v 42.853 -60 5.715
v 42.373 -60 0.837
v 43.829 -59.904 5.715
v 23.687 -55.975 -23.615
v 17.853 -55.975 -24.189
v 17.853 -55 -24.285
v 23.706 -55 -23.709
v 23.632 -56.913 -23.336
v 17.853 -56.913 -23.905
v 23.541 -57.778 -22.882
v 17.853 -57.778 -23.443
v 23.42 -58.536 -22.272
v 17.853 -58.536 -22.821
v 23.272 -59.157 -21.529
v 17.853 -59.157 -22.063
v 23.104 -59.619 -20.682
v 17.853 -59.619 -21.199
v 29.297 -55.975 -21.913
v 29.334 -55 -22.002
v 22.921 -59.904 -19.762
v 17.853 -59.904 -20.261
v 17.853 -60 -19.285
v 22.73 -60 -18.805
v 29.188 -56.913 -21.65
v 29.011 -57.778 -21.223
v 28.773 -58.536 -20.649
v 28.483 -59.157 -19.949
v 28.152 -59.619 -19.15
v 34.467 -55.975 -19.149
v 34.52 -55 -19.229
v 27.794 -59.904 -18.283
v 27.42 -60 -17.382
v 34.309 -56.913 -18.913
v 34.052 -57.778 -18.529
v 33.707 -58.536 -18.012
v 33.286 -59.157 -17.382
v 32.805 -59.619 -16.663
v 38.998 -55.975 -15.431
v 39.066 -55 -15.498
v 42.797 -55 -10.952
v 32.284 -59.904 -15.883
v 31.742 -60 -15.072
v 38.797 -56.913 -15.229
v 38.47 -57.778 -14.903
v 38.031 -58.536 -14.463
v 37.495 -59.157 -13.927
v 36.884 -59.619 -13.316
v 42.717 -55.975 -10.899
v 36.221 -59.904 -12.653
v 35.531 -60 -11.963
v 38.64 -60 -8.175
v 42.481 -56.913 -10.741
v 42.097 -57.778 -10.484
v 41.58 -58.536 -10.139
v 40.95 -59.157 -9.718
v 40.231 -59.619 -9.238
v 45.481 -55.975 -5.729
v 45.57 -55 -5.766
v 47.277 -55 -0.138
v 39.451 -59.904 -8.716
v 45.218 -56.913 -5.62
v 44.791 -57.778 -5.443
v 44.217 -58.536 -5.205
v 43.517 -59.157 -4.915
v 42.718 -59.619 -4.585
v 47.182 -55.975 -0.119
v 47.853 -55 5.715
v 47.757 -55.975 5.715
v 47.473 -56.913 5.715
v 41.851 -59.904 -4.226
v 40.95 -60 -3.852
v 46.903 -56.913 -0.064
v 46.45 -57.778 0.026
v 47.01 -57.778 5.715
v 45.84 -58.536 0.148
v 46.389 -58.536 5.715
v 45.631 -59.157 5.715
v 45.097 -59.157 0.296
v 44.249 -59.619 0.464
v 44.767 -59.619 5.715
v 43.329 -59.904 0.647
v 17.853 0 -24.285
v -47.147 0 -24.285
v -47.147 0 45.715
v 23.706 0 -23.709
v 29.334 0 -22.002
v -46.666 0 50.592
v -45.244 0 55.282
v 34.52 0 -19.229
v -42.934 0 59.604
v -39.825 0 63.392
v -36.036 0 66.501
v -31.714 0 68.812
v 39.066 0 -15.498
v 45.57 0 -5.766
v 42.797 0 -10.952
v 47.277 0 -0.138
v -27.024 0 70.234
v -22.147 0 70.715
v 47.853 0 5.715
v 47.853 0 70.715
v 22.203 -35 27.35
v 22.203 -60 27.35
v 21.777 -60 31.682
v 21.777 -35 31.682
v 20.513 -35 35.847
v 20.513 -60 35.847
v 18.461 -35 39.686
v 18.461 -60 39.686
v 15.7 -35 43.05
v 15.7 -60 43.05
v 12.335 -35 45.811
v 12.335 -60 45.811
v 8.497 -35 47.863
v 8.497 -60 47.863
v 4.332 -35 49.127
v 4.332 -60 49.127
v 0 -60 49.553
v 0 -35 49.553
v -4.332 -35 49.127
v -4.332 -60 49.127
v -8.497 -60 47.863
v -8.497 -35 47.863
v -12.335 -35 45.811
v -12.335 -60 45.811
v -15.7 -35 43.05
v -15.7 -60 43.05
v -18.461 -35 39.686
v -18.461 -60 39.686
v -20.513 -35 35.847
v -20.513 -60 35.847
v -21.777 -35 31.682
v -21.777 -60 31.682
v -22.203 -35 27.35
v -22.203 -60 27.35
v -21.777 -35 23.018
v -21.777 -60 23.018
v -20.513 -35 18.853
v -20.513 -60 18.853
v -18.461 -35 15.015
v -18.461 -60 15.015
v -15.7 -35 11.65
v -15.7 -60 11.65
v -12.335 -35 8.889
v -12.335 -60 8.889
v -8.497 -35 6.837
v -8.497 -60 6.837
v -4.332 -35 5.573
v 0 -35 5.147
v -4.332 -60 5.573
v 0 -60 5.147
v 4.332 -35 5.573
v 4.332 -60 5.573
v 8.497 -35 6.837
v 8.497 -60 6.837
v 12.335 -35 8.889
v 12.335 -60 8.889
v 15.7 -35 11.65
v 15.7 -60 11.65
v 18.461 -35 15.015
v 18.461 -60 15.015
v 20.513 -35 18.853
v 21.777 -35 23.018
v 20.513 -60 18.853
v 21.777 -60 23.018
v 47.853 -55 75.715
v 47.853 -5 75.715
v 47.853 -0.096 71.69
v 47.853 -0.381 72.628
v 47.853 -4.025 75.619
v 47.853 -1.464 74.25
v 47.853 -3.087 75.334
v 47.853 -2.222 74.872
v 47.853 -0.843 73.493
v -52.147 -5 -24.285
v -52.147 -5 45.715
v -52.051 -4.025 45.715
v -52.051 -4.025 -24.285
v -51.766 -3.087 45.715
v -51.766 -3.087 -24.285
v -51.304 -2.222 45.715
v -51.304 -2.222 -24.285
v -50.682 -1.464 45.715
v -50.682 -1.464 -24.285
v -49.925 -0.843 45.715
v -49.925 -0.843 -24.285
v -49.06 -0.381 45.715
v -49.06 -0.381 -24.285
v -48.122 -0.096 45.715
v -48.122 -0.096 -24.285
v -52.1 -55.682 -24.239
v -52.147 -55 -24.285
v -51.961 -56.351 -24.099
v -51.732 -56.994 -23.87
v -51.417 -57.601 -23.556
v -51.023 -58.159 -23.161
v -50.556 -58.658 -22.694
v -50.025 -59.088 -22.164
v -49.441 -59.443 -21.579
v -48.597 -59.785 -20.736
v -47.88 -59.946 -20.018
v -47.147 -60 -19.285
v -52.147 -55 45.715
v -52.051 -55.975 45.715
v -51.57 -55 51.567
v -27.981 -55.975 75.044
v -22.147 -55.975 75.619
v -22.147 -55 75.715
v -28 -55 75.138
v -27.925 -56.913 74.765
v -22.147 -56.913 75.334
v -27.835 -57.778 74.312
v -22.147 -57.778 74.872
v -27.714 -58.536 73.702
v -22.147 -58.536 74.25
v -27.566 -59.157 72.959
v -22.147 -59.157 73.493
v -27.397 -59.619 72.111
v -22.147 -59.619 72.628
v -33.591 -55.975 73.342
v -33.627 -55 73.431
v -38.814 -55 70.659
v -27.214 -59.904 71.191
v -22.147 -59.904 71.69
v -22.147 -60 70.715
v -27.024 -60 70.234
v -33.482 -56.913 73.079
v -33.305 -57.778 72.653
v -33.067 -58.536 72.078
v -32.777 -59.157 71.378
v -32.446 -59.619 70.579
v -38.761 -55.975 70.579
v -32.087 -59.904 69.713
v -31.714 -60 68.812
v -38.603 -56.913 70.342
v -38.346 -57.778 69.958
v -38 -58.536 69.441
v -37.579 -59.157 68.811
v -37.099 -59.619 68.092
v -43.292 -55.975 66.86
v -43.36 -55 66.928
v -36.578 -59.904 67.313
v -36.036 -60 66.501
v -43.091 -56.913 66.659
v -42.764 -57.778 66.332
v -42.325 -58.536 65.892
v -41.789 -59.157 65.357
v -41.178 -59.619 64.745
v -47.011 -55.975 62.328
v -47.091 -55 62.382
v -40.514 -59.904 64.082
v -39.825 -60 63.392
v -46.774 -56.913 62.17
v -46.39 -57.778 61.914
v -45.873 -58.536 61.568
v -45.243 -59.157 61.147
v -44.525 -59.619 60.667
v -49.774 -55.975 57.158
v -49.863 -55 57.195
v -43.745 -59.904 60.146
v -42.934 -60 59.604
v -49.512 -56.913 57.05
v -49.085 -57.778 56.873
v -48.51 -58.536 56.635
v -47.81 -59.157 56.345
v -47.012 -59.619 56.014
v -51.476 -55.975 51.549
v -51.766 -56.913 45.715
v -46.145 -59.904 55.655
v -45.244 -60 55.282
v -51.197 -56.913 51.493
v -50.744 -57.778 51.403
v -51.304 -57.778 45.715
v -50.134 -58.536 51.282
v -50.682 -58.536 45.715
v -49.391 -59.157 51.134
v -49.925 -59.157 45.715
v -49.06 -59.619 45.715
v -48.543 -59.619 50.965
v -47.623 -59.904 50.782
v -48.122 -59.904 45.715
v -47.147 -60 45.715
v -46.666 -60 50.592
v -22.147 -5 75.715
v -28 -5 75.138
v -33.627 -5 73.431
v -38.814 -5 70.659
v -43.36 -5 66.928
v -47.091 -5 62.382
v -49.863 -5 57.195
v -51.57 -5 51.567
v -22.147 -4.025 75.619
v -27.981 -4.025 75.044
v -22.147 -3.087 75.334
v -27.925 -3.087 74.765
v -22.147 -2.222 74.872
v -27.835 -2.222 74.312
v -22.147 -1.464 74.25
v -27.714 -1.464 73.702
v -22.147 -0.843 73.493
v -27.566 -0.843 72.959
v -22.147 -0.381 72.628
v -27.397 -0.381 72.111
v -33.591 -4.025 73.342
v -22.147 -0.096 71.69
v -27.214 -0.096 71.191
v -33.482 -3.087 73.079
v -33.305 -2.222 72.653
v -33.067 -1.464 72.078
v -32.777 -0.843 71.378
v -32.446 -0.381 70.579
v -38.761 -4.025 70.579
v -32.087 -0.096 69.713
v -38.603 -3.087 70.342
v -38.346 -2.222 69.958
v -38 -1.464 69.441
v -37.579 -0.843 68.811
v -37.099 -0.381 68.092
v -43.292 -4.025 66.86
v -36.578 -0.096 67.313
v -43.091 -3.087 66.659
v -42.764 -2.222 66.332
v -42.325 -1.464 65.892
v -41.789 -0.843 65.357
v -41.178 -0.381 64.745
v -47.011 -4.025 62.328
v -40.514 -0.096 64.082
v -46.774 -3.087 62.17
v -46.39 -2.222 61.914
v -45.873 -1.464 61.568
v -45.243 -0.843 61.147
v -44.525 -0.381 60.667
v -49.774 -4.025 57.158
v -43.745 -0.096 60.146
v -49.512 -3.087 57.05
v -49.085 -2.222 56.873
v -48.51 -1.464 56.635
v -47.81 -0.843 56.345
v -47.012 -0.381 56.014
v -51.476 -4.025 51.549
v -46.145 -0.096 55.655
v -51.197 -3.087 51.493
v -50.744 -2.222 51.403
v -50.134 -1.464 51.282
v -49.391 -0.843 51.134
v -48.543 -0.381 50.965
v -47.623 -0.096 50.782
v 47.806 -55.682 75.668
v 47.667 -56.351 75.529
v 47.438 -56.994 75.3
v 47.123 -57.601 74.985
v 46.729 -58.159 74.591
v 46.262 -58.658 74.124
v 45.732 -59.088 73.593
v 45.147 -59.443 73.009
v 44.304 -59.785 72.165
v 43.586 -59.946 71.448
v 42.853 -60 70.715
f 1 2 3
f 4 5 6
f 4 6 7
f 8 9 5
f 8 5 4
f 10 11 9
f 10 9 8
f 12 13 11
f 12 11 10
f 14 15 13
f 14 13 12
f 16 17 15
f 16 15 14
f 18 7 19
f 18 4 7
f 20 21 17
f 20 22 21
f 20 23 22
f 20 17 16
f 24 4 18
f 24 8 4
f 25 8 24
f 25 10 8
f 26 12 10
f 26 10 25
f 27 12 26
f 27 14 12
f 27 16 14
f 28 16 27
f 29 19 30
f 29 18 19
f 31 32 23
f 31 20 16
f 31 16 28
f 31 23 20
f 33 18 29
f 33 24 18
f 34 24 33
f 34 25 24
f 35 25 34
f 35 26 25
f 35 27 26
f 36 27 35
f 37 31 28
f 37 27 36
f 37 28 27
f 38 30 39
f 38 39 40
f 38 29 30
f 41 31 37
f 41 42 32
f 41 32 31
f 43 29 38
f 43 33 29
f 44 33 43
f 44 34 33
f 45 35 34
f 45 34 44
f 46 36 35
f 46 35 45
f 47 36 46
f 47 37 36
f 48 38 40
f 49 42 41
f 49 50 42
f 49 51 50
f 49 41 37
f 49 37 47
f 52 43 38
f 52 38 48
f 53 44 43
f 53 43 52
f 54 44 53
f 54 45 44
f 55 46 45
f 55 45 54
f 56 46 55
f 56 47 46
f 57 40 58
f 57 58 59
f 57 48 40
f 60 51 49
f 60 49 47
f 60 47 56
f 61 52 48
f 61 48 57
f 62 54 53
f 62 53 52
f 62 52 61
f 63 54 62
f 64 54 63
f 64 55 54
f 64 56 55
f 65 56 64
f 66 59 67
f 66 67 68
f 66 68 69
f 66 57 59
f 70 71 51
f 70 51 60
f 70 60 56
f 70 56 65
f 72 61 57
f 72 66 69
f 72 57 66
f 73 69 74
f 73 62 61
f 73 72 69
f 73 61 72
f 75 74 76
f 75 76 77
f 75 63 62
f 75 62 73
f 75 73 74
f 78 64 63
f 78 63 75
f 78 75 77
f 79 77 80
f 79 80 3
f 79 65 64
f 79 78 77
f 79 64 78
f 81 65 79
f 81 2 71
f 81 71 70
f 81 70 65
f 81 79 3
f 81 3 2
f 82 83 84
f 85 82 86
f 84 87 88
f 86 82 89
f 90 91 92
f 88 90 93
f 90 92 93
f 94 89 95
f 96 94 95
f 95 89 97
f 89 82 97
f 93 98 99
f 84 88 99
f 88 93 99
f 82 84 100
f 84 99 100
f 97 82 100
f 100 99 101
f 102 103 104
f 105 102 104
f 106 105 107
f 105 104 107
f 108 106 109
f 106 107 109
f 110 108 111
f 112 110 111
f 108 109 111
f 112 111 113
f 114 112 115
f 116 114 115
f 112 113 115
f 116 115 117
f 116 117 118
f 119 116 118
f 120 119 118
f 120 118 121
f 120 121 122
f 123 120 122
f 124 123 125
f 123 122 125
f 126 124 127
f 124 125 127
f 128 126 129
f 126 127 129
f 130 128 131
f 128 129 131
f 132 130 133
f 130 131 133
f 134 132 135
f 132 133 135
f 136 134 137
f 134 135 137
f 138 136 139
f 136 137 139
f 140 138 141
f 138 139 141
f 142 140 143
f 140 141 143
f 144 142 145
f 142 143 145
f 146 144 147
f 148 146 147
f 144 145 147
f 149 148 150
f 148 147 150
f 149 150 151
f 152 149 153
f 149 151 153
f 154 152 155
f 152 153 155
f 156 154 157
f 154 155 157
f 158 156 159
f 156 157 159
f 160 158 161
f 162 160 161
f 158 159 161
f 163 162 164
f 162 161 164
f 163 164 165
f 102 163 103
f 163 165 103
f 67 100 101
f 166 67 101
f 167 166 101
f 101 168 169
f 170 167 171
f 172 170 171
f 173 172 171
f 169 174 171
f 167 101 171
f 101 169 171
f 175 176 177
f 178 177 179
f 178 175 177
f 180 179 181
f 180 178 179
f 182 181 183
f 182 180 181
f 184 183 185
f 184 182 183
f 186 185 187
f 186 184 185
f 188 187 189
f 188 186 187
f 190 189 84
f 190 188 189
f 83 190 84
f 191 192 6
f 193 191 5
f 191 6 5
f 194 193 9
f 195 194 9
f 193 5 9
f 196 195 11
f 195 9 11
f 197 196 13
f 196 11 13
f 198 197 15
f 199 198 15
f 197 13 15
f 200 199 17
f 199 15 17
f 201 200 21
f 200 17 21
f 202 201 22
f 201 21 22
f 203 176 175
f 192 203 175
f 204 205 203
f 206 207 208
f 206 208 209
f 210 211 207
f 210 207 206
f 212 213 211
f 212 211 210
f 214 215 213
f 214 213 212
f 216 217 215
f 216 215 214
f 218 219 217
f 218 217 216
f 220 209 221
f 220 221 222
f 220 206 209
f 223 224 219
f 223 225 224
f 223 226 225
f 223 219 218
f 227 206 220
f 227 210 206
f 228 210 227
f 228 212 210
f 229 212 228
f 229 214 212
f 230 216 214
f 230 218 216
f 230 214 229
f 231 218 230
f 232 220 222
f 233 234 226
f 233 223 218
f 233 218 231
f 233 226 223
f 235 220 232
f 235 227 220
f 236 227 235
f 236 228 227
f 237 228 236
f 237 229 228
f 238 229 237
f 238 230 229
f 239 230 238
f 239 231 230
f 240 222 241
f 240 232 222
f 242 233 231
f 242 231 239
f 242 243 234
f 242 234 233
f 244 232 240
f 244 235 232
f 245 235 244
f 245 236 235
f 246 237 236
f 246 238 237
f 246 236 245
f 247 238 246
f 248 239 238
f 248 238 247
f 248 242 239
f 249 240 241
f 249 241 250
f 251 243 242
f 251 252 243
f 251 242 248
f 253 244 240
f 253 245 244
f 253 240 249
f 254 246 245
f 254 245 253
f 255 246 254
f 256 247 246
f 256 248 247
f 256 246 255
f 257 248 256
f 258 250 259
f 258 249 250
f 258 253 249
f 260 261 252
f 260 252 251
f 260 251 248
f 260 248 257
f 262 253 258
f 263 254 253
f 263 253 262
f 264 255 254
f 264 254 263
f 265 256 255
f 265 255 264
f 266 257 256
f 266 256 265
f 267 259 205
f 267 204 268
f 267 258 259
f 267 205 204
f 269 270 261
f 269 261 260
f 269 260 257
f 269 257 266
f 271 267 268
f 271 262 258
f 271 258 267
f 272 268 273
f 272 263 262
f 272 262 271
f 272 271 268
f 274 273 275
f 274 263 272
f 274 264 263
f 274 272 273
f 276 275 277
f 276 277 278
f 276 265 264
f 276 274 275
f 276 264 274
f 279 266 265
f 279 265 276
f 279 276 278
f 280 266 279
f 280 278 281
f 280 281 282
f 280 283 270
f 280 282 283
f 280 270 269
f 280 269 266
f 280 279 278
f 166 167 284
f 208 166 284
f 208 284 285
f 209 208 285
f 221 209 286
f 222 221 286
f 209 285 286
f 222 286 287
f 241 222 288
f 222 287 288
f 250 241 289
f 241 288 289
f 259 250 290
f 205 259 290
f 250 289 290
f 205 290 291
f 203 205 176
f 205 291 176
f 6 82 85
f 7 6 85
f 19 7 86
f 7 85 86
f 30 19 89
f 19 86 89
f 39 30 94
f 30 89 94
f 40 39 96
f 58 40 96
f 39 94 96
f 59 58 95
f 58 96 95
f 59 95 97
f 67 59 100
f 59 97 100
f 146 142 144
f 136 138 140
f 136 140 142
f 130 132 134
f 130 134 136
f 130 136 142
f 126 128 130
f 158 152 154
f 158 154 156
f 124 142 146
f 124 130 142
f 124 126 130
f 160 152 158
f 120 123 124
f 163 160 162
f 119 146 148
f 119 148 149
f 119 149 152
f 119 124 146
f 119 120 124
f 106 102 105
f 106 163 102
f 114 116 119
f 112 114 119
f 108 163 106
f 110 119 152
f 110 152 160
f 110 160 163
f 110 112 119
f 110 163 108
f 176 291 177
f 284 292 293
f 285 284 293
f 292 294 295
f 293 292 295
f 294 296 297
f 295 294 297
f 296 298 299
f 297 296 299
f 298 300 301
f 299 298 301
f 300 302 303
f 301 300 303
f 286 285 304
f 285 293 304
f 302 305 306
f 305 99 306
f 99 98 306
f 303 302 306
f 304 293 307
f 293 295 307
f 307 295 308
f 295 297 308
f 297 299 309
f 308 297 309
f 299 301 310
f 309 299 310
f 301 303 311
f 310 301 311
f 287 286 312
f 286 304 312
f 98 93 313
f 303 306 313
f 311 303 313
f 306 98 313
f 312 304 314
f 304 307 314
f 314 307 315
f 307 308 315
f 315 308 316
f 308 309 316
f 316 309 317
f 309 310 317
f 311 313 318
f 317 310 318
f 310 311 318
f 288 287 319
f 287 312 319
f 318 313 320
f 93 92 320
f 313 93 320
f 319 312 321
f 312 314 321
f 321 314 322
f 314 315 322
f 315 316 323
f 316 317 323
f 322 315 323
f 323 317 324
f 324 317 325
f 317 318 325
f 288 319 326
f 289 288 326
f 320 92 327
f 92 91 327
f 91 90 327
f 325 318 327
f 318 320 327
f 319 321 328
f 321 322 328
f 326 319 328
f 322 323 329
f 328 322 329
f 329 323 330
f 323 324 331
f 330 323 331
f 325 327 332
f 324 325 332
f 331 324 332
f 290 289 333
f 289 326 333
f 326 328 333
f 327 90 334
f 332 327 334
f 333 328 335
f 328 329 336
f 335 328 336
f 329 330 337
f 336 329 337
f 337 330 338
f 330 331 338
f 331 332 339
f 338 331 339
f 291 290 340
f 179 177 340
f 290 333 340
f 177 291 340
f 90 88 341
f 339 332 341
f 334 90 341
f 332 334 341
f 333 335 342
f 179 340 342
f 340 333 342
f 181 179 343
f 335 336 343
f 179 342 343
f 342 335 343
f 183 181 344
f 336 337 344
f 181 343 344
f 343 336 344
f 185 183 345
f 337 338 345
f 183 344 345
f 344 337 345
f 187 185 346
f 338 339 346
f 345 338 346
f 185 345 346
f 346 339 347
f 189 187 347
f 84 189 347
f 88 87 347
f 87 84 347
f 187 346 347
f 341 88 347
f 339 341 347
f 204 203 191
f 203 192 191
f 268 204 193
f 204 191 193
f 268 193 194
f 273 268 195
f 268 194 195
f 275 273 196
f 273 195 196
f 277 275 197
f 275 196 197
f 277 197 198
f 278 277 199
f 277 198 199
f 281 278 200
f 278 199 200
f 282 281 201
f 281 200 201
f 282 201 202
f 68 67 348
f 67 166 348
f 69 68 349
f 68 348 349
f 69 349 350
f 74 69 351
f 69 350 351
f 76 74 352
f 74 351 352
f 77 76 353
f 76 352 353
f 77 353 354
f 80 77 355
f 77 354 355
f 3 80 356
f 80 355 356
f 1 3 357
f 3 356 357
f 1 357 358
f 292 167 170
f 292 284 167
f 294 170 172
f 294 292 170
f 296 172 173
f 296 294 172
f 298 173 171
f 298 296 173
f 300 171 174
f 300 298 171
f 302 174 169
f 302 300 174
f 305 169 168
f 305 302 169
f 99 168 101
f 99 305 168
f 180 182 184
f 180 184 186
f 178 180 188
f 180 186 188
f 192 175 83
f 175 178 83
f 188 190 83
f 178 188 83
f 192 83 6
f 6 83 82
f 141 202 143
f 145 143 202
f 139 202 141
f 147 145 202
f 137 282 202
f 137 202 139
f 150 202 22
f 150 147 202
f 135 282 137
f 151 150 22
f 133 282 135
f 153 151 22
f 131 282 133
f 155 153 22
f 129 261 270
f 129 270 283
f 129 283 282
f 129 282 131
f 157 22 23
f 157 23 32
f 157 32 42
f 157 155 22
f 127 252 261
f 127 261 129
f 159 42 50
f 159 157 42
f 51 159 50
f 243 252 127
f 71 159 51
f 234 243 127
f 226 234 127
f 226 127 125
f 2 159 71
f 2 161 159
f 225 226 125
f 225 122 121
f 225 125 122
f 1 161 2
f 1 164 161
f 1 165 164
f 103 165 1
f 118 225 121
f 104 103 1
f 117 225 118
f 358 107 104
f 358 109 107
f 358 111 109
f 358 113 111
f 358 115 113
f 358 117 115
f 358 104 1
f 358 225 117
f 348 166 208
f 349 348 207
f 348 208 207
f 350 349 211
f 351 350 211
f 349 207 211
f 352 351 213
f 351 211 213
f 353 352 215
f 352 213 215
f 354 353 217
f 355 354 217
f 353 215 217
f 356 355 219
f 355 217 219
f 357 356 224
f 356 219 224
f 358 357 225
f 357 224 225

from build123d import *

# Parameters (mm, degrees)
F1_DEPTH = 60
F2_R     = 5
F3_R     = 22.203216
F4_DEPTH = 25


with BuildPart() as f1:
    # F0 (on Front) → F1 (new body)
    with BuildSketch(Plane.XZ):
        with BuildLine():
            Line((47.853137, 75.714735), (-22.146863, 75.714735))
            ThreePointArc((-22.146863, 75.714735), (-43.360067, 66.927938), (-52.146863, 45.714735))
            Line((-52.146863, 45.714735), (-52.146863, -24.285265))
            Line((-52.146863, -24.285265), (17.853137, -24.285265))
            ThreePointArc((17.853137, -24.285265), (39.06634, -15.498468), (47.853137, 5.714735))
            Line((47.853137, 5.714735), (47.853137, 75.714735))
        make_face()
    extrude(amount=F1_DEPTH)

    # F2
    f2_edges = [f1.edges().sort_by_distance(p)[0] for p in [
        (-22.146863, -30, 75.714735),
        (-52.146863, -30, 45.714735),
        (-43.360067, 0, 66.927938),
        (-43.360067, -60, 66.927938),
        (47.853137, -60, 40.714735),
        (12.853137, -60, 75.714735),
        (-52.146863, -60, 10.714735),
        (-17.146863, -60, -24.285265),
        (39.06634, -60, -15.498468),
    ]]
    fillet(f2_edges, radius=F2_R)

    # F3 (on face) → F4 (cut)
    with BuildSketch(Plane.XZ.offset(60)):
        with Locations((0, 27.350072)):
            Circle(F3_R)
    extrude(amount=-F4_DEPTH, mode=Mode.SUBTRACT)


solid = f1.part
